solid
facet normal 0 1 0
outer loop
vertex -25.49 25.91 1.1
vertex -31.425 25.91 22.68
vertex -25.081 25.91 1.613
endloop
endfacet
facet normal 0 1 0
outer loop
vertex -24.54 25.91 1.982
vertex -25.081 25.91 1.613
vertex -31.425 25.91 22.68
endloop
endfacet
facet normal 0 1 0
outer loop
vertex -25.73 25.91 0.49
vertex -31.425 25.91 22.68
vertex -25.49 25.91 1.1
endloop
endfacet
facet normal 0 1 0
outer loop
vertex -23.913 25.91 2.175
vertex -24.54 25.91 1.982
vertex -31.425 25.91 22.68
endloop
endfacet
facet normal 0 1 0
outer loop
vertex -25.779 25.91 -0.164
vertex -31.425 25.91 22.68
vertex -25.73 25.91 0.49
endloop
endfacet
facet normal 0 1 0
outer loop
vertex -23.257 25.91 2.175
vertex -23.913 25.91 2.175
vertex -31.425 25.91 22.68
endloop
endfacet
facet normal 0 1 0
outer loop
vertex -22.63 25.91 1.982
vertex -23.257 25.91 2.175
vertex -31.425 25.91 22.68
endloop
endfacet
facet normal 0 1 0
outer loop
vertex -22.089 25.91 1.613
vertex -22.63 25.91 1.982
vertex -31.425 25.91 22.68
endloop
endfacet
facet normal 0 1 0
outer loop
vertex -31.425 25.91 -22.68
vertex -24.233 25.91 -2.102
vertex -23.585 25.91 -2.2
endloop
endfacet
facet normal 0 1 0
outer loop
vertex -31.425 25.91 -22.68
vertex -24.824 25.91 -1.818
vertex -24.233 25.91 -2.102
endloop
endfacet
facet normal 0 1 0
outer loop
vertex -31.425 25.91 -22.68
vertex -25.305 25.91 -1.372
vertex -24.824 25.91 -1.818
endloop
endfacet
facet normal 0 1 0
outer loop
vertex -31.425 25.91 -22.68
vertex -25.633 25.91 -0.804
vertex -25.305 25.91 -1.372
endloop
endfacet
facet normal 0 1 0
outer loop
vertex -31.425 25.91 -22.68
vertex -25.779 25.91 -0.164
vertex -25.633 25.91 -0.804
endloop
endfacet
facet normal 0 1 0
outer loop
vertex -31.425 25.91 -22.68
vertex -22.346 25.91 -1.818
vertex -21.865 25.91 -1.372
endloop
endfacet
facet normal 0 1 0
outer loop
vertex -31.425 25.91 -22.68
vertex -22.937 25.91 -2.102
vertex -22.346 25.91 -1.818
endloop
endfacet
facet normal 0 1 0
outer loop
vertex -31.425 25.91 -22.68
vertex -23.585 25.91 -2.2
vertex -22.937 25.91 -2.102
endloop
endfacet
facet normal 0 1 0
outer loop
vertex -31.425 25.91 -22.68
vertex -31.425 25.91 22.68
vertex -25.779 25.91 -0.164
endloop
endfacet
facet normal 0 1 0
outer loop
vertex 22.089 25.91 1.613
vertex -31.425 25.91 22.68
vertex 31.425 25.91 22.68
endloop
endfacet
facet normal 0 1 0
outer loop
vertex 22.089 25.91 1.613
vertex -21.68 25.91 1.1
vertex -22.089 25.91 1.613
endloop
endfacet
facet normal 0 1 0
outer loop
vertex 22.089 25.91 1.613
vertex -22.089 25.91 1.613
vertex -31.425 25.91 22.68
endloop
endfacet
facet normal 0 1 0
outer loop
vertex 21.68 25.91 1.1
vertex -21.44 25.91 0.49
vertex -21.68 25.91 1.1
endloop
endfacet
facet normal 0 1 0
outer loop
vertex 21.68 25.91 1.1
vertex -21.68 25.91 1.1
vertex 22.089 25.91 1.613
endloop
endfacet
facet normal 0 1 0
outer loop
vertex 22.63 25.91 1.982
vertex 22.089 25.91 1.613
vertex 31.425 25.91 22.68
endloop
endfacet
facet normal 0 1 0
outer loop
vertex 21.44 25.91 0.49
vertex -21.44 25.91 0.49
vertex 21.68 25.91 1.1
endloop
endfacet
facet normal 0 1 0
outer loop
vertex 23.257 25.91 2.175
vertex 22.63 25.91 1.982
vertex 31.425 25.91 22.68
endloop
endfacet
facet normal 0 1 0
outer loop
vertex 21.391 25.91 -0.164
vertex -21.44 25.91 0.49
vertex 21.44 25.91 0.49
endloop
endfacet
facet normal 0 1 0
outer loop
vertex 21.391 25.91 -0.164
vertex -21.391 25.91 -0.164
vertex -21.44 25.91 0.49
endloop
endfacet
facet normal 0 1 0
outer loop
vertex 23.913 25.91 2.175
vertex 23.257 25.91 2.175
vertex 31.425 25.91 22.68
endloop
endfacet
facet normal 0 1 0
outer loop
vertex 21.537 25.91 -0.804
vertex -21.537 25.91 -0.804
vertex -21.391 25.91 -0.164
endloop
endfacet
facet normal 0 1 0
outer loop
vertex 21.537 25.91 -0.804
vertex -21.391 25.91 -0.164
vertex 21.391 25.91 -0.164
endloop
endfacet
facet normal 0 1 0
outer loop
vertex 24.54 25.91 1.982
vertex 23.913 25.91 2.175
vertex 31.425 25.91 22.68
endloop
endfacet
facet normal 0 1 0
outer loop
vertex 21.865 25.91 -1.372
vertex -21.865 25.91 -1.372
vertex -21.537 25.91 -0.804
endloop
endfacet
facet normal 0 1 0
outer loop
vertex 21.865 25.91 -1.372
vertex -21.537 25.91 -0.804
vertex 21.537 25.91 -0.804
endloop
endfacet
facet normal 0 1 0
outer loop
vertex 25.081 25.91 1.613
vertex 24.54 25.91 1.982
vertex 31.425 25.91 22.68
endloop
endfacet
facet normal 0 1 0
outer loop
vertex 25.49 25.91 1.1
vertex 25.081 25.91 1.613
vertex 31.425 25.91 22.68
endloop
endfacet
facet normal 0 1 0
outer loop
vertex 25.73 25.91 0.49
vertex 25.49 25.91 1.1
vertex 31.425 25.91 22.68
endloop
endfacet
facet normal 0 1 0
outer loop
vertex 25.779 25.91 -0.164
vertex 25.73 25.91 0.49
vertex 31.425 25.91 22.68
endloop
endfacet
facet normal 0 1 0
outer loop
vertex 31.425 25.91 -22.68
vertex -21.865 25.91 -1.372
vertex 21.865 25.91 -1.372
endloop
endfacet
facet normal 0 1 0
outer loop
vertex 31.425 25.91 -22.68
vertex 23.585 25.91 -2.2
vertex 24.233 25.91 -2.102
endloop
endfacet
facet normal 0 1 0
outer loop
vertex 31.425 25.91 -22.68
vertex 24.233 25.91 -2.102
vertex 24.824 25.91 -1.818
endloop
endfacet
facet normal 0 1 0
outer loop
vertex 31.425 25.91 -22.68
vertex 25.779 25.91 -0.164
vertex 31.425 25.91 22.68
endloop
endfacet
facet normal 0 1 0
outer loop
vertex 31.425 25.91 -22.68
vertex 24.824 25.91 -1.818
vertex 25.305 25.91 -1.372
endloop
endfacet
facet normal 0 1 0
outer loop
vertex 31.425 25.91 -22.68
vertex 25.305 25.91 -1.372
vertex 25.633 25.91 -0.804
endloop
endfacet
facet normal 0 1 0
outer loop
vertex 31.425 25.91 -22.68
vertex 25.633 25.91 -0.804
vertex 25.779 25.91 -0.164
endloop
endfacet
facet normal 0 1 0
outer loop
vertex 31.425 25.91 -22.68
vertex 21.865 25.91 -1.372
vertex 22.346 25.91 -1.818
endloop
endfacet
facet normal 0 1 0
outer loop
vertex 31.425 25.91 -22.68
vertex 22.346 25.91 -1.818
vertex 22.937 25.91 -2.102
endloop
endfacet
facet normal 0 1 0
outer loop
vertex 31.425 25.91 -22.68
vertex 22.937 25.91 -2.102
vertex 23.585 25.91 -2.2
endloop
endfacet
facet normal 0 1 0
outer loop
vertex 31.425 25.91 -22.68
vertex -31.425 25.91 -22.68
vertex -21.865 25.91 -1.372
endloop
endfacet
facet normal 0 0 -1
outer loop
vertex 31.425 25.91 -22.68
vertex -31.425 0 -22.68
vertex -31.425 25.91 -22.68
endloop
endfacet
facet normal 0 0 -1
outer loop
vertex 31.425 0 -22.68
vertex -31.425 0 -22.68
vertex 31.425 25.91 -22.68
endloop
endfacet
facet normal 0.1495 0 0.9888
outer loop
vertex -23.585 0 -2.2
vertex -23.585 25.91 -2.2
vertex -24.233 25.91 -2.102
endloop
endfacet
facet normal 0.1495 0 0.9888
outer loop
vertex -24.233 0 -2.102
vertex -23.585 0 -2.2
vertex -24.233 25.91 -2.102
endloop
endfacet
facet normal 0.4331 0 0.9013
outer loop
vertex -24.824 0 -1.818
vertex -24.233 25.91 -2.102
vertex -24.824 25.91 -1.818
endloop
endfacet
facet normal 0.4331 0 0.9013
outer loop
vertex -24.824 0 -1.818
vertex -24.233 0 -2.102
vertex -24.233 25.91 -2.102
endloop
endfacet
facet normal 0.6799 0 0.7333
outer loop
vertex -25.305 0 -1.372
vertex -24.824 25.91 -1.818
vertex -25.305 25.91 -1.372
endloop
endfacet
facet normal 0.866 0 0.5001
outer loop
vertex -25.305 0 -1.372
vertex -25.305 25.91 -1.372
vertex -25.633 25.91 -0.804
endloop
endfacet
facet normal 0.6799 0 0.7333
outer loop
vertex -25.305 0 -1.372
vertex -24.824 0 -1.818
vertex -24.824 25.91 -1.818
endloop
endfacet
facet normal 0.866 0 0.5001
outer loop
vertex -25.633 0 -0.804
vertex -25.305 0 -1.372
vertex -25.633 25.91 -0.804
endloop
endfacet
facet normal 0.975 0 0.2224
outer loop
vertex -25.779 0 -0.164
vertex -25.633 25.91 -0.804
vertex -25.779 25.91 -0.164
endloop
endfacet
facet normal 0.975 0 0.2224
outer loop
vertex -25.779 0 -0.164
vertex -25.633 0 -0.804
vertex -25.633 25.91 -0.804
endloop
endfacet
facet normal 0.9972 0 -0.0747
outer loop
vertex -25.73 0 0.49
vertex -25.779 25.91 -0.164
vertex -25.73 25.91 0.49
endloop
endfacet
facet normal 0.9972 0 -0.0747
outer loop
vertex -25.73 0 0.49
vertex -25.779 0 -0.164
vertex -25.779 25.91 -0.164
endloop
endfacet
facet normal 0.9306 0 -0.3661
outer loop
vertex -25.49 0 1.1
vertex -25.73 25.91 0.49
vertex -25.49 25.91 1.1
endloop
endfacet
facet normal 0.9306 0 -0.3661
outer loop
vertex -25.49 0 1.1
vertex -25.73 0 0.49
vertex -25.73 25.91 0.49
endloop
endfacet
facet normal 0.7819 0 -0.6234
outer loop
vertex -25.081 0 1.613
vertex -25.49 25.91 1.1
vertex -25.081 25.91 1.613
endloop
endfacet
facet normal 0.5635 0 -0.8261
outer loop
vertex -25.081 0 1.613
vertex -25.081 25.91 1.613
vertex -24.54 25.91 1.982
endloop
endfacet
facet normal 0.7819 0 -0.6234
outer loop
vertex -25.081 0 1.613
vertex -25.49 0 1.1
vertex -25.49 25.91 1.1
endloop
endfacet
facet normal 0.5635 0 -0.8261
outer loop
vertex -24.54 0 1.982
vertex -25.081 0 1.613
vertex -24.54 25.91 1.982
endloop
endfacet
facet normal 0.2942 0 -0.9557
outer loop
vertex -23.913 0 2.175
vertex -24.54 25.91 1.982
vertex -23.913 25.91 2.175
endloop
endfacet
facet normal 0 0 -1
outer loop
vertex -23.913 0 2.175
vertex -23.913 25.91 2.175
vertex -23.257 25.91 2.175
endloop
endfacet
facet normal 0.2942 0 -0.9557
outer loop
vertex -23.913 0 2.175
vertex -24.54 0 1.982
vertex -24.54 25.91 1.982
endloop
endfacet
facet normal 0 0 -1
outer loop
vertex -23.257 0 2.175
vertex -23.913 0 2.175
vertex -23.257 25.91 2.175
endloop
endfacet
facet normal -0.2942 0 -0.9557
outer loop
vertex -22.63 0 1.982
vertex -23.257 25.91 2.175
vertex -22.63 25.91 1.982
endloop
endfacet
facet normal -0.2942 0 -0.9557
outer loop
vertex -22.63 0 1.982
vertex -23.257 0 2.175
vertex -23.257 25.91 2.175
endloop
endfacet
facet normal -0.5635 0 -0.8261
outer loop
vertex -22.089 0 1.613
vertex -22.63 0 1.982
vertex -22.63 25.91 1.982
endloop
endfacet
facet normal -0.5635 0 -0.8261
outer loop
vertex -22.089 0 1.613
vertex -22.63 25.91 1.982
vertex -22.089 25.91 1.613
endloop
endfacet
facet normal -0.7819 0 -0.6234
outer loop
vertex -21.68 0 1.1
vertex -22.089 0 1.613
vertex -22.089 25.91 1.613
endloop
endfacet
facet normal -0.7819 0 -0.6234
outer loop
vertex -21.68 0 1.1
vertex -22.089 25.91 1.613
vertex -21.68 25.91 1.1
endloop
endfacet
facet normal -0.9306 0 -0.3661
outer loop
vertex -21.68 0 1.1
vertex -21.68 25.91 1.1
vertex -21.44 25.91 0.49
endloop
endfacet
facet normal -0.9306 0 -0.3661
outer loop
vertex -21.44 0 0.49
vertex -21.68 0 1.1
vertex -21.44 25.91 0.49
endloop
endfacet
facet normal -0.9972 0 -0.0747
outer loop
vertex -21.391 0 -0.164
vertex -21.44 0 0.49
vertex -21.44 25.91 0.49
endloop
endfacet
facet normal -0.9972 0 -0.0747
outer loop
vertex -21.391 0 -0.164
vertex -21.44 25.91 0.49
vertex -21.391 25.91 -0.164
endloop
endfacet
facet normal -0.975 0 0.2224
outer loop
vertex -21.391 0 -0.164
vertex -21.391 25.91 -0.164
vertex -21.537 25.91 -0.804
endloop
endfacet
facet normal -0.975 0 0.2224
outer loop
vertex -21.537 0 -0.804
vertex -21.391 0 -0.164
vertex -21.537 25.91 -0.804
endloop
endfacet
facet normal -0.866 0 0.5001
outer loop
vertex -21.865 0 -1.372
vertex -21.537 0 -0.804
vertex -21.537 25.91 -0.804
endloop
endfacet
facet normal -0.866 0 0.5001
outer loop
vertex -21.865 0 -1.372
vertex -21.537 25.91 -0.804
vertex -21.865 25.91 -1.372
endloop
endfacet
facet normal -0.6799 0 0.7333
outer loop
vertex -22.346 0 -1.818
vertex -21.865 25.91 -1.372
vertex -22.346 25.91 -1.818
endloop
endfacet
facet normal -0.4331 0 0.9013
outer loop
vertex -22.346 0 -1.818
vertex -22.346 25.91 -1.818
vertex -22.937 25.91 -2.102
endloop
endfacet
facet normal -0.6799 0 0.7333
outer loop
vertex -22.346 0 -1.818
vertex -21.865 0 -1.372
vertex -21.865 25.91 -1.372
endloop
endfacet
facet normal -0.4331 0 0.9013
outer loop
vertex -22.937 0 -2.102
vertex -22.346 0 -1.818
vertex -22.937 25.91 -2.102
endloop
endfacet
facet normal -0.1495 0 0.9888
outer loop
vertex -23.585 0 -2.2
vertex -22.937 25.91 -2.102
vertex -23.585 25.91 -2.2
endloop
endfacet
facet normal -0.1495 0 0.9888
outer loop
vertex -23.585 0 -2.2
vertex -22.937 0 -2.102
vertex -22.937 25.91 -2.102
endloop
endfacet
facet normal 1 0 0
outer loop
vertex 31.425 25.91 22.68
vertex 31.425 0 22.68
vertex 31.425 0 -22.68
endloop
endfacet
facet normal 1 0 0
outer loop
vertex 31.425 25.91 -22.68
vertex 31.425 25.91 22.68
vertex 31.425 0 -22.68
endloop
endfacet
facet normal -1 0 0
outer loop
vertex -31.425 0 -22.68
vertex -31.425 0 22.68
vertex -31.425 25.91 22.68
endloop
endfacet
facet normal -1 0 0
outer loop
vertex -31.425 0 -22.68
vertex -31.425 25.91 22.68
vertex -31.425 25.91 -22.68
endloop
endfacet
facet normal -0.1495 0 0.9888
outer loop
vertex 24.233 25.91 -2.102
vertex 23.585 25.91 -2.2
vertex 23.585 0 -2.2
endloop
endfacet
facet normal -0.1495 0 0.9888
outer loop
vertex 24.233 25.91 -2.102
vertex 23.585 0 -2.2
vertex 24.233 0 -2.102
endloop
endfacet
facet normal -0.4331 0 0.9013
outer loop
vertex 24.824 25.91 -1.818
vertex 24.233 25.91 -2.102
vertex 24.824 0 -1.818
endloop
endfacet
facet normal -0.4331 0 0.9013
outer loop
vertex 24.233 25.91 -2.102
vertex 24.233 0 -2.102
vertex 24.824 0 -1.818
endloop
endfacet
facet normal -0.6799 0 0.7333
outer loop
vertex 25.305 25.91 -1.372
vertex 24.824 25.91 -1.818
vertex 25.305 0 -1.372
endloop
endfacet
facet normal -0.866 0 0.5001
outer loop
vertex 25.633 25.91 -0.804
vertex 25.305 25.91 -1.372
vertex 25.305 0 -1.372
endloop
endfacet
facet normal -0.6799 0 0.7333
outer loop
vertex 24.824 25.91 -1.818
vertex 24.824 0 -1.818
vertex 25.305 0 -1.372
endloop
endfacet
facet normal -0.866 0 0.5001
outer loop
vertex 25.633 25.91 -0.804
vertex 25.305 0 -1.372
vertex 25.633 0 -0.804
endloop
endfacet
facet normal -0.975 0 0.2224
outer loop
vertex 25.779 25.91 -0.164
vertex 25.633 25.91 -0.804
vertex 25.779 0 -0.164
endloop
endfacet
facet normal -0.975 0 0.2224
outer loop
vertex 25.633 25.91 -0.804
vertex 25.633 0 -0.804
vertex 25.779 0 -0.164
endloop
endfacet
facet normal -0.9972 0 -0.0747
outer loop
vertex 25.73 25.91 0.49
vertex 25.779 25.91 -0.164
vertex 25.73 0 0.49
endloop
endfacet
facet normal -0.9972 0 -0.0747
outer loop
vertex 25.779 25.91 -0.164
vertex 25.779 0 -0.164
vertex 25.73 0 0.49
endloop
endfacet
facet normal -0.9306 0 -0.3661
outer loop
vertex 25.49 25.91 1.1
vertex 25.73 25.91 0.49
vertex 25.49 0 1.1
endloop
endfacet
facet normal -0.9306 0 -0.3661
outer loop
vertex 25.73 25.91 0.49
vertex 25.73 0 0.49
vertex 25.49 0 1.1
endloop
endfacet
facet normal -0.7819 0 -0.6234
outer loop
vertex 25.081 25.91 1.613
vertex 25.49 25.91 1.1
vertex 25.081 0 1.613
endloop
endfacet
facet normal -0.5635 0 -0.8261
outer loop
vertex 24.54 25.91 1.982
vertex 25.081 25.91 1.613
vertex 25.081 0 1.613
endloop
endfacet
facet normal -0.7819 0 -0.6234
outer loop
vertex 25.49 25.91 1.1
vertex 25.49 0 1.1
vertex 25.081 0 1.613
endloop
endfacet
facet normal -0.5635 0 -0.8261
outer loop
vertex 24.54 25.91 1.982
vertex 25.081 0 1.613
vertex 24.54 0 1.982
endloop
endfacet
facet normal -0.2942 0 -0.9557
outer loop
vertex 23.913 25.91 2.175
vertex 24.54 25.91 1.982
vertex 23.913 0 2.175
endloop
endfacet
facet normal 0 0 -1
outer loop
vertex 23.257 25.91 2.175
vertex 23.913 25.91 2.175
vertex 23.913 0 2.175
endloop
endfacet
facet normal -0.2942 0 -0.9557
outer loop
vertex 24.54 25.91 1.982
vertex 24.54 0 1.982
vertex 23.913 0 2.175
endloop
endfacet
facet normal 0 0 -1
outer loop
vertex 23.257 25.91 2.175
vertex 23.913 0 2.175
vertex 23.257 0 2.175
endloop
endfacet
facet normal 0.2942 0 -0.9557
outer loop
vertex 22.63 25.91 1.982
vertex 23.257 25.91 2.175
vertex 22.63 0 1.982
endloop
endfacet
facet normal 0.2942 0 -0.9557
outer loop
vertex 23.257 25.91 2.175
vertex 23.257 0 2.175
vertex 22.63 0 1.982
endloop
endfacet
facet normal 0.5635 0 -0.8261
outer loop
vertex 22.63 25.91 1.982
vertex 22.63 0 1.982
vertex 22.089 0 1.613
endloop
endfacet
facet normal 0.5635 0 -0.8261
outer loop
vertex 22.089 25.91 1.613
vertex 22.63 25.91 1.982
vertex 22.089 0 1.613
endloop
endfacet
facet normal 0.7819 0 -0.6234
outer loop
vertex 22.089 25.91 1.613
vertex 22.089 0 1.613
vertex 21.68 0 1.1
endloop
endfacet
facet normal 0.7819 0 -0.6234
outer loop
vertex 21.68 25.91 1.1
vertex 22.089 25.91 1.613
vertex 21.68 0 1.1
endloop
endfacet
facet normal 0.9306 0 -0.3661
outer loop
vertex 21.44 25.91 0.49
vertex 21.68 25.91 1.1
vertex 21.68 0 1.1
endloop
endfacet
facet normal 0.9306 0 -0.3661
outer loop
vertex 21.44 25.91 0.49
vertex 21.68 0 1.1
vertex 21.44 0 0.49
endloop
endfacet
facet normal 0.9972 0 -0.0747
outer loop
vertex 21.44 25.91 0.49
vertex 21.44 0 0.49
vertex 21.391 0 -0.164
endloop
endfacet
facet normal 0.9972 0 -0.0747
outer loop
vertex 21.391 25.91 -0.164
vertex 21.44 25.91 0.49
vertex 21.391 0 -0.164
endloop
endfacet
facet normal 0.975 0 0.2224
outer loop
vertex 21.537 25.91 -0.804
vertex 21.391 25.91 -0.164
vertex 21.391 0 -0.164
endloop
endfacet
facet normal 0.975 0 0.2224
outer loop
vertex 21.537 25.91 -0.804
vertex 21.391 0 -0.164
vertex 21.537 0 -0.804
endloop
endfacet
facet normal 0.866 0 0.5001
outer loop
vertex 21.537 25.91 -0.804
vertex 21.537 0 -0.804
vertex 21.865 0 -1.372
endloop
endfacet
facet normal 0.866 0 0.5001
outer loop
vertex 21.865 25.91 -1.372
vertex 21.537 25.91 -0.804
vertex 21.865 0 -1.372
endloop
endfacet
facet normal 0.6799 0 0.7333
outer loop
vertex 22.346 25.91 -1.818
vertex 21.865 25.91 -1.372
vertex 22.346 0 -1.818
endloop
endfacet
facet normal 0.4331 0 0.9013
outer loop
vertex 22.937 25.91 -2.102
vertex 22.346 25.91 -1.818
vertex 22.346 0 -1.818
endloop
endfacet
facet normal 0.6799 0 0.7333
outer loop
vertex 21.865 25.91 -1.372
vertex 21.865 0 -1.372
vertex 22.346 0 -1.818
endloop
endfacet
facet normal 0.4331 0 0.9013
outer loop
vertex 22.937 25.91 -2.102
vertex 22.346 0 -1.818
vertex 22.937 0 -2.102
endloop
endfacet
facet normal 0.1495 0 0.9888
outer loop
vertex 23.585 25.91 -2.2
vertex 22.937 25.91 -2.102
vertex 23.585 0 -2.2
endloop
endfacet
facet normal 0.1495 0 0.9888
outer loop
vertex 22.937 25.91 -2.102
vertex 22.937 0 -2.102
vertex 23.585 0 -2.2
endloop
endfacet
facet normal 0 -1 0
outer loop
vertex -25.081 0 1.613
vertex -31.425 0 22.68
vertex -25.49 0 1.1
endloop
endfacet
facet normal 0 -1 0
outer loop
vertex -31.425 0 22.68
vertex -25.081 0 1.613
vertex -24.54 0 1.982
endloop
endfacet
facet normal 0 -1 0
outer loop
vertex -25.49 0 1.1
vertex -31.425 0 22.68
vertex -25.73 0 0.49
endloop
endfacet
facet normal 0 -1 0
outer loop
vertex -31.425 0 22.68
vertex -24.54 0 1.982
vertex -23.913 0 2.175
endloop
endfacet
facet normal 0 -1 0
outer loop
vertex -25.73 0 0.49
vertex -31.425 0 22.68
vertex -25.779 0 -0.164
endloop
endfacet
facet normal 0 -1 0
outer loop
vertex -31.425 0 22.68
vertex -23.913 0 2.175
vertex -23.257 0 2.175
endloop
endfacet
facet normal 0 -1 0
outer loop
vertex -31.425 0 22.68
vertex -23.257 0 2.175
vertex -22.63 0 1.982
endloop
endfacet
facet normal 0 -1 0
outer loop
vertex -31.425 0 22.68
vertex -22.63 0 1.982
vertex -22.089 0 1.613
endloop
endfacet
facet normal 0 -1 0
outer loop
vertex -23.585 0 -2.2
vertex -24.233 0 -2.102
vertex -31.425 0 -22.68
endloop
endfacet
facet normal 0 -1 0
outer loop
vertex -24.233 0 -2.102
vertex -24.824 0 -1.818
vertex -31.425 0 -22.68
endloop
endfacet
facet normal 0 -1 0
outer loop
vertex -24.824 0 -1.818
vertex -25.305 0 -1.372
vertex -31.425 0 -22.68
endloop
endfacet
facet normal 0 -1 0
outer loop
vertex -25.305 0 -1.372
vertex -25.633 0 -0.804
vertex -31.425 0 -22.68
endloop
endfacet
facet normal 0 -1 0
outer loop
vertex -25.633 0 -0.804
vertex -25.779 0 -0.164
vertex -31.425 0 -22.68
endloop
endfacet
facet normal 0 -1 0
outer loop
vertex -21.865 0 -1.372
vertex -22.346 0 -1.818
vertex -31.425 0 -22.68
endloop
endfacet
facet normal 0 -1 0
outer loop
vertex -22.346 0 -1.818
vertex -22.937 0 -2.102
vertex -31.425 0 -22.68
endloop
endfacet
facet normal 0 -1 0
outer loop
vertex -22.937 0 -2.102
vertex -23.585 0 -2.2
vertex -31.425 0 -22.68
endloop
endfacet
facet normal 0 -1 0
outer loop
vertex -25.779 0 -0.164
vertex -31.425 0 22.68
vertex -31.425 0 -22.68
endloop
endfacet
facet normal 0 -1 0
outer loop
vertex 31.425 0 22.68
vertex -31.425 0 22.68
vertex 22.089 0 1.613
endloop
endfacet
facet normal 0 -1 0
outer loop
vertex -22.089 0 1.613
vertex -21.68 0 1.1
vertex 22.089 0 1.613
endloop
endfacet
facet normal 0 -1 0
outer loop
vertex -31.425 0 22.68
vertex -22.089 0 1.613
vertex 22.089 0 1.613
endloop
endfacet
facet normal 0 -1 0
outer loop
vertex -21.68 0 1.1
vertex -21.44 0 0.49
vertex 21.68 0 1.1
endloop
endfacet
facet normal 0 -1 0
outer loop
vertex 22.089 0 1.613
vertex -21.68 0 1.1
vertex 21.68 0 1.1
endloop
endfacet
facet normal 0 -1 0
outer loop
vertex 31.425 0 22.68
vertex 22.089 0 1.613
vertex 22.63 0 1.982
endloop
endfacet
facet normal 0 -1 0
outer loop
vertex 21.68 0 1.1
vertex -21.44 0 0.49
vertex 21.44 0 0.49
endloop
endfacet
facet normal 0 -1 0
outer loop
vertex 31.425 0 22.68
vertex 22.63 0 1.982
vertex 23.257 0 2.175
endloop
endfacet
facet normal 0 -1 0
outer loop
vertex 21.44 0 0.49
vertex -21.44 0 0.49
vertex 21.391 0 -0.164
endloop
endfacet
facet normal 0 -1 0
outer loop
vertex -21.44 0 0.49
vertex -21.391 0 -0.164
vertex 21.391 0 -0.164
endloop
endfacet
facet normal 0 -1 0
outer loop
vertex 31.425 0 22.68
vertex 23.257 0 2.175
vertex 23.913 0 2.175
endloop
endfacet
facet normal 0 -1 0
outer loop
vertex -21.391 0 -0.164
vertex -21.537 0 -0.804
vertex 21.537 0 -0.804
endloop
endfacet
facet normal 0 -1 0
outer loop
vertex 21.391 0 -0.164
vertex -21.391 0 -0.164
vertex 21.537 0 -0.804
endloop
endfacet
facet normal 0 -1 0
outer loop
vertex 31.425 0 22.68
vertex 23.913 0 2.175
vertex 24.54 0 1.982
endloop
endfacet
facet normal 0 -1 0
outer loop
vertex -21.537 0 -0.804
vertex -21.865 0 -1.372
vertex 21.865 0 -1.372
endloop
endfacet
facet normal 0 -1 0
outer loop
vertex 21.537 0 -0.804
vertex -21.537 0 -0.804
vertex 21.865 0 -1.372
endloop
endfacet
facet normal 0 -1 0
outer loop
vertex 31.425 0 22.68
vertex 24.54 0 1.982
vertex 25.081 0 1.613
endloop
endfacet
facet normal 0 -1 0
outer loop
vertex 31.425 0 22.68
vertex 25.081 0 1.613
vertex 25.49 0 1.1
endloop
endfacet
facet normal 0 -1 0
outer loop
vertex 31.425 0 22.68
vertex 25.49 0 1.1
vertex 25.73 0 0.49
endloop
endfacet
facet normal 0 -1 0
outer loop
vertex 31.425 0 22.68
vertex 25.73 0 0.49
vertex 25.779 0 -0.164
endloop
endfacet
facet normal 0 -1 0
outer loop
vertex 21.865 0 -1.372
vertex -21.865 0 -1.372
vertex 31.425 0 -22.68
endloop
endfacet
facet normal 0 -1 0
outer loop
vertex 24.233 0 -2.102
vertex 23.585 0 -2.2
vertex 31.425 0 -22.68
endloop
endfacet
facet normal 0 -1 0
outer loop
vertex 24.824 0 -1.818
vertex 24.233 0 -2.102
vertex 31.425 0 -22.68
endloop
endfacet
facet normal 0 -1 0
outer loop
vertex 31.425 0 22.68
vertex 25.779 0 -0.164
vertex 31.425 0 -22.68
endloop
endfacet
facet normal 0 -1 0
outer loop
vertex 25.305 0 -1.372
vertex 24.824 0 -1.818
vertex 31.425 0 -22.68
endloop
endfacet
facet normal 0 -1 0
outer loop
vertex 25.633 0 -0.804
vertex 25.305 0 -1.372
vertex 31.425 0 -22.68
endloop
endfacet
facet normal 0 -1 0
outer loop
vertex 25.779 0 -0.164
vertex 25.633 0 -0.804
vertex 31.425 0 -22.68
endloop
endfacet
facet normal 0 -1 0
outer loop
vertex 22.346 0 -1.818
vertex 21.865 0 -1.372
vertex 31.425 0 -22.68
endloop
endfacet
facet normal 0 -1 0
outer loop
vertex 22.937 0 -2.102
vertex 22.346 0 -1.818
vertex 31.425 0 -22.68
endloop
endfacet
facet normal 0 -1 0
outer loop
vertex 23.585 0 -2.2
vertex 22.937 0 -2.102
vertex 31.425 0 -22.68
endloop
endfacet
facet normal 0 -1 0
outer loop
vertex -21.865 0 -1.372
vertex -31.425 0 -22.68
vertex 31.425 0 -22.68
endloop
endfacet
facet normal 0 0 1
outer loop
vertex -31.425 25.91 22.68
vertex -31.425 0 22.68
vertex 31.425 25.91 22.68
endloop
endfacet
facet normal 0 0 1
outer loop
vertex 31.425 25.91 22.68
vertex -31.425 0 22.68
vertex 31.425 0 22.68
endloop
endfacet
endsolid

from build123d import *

# Parameters (mm, degrees)
SKETCH1_W           = 62.85
SKETCH1_H           = 45.36
BOSS_EXTRUDE1_DEPTH = 25.91
SKETCH2_R           = 2.2
CUT_EXTRUDE1_DEPTH  = 25.91


with BuildPart() as part:
    # Sketch1 → Boss-Extrude1 (new body)
    with BuildSketch(Plane(origin=(0, 0, 0), x_dir=(1, 0, 0), z_dir=(0, 1, 0))):
        Rectangle(SKETCH1_W, SKETCH1_H)
    extrude(amount=BOSS_EXTRUDE1_DEPTH)

    # Sketch2 → Cut-Extrude1 (cut)
    with BuildSketch(Plane.XZ):
        with Locations(Location((23.585, 0, 0), (0, 0, 270))):
            Circle(SKETCH2_R)
    cut_extrude1 = extrude(amount=-CUT_EXTRUDE1_DEPTH, mode=Mode.SUBTRACT)

    # Mirror1: Cut-Extrude1 across plane
    add(cut_extrude1.mirror(Plane(origin=(0, 0, 0), x_dir=(0, 0, 1), z_dir=(1, 0, 0))), mode=Mode.SUBTRACT)


solid = part.part
